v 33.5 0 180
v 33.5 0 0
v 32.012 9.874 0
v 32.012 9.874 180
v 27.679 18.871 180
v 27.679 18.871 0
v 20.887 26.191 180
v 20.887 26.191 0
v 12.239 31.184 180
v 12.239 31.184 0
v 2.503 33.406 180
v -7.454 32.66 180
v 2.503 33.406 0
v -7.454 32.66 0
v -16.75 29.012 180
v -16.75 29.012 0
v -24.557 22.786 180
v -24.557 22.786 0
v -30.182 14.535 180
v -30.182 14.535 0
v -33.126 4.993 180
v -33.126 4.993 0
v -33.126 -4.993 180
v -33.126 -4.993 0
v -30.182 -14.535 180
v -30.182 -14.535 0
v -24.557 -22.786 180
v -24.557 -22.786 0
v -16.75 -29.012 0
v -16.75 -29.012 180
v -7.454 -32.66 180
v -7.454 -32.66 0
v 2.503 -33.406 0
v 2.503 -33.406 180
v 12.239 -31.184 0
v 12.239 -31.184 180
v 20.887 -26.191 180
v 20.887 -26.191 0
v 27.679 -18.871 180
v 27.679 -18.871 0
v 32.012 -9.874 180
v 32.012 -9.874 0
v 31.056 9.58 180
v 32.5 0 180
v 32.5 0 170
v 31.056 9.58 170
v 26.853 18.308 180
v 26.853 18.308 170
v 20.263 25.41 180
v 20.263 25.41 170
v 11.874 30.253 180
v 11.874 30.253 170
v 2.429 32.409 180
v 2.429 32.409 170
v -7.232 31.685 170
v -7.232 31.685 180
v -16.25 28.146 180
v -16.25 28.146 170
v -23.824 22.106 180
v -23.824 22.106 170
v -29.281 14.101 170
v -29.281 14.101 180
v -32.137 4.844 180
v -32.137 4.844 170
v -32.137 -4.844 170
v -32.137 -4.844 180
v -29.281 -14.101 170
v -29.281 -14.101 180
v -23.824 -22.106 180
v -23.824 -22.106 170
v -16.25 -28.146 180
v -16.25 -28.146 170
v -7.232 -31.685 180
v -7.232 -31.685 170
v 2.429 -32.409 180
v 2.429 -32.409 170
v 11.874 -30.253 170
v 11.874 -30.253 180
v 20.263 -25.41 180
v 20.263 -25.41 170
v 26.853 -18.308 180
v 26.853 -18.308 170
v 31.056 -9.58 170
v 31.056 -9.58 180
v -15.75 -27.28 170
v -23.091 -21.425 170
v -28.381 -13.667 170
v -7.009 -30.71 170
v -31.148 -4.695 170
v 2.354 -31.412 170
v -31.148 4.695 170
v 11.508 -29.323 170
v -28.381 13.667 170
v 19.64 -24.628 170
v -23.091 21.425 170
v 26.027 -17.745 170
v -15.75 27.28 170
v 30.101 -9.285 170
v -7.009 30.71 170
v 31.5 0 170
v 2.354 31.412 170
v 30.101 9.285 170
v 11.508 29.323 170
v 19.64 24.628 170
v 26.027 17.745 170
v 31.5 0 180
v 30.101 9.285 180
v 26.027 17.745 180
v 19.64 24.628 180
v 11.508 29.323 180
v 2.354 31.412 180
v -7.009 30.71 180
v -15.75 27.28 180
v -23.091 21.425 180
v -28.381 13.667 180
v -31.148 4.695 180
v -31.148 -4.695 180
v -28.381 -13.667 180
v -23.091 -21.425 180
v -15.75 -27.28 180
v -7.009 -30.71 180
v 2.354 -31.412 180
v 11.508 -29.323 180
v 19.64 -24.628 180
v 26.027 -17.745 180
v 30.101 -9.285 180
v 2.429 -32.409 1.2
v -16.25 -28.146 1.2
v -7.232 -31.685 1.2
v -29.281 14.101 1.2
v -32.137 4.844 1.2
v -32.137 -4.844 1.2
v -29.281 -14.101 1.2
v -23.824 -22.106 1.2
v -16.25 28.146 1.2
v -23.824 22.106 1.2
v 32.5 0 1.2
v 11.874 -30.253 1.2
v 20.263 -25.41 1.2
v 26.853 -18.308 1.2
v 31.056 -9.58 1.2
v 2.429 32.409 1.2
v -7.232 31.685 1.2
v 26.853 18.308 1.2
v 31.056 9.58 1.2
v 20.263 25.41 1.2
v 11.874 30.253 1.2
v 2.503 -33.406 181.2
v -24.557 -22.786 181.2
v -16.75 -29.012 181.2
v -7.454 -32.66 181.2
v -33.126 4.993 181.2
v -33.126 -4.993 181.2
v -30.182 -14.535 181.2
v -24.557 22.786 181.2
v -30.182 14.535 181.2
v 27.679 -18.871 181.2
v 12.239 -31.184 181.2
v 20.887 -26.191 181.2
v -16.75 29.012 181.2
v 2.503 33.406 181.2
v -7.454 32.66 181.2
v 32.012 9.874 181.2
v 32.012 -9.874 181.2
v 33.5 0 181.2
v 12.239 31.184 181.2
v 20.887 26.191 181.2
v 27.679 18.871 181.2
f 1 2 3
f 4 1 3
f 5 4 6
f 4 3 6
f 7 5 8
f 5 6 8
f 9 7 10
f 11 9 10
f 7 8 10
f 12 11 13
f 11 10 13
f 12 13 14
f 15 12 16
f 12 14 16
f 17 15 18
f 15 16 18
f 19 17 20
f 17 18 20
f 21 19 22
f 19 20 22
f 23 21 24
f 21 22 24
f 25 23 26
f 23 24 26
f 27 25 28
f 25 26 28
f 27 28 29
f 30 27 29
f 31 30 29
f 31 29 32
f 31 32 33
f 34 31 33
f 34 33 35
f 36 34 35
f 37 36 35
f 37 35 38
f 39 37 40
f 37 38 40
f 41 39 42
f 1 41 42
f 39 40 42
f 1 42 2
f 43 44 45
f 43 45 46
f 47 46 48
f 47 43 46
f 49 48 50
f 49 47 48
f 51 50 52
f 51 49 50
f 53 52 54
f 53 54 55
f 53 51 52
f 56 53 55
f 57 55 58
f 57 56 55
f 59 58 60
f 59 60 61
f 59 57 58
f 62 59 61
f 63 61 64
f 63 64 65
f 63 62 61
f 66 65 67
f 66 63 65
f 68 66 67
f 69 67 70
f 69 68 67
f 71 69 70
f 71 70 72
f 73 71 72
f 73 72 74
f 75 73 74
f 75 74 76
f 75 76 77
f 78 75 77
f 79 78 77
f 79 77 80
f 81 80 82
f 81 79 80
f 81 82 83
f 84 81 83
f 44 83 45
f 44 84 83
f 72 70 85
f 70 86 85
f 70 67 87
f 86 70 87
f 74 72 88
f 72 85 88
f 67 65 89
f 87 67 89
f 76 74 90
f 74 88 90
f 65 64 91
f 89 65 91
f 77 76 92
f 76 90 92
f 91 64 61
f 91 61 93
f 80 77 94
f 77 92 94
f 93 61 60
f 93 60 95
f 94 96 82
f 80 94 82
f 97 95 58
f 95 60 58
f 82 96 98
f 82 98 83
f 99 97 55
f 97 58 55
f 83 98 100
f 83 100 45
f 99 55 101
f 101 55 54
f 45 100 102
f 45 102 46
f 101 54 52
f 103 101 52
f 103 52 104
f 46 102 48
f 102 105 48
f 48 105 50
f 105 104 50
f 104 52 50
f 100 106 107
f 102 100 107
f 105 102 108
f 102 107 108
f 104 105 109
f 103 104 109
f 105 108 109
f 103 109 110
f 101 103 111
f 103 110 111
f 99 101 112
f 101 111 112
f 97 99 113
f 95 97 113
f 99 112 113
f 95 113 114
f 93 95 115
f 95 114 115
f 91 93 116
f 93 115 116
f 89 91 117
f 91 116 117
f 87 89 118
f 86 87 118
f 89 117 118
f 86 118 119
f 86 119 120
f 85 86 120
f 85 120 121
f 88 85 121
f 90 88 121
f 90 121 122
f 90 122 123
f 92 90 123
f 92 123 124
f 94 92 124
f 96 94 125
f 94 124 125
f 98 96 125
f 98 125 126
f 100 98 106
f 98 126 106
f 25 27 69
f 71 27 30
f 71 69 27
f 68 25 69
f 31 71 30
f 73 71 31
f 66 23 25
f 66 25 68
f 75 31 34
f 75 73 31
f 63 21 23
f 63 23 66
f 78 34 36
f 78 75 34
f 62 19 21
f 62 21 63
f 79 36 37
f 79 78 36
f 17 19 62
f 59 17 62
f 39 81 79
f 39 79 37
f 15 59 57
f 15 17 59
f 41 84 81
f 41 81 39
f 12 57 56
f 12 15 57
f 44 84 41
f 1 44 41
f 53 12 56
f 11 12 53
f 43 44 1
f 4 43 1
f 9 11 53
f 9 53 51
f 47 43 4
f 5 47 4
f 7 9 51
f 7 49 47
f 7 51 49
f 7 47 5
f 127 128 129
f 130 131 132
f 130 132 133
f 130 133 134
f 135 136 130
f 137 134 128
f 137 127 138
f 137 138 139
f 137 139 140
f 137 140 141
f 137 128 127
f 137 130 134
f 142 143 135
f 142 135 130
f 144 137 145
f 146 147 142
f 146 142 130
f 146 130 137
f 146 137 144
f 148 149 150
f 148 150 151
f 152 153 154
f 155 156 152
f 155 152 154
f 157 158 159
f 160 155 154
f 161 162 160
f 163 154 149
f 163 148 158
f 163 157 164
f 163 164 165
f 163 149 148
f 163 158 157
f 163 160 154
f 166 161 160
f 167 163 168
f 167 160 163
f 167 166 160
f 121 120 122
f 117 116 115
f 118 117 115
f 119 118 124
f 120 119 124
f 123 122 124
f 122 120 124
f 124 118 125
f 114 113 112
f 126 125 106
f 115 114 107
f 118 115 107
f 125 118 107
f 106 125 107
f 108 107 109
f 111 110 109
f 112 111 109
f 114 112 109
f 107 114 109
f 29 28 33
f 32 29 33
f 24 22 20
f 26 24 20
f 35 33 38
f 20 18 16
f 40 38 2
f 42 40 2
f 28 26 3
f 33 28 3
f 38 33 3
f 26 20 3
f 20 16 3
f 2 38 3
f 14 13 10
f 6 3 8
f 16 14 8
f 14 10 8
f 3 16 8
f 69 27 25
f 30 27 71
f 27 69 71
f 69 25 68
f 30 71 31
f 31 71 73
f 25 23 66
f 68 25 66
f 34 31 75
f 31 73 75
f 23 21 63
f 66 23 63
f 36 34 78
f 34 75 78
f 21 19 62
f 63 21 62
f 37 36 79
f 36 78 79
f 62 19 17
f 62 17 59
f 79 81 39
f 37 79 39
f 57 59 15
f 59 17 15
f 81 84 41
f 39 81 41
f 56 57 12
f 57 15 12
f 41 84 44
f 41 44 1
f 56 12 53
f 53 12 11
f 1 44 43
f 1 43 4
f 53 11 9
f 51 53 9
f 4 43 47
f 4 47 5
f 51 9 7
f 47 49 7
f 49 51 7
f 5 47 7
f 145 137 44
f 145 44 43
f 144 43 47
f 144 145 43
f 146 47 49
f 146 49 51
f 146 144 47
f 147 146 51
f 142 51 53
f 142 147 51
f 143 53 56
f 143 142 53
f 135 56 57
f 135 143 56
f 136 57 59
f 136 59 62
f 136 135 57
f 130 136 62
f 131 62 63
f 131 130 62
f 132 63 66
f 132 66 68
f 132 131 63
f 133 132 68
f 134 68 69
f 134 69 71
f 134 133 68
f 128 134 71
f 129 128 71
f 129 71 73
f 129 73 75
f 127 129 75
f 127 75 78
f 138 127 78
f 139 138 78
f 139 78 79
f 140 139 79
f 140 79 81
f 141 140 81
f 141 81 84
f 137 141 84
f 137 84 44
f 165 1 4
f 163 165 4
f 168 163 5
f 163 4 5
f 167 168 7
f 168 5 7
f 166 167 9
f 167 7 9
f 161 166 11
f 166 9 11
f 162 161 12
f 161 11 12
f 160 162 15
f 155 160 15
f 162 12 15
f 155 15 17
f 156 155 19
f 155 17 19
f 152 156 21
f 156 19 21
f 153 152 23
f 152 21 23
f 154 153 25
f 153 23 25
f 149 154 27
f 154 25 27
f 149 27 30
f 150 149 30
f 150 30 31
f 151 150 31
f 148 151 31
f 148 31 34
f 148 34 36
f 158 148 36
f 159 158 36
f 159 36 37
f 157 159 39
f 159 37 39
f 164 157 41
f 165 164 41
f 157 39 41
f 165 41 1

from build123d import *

# Parameters (mm, degrees)
F0_R     = 33.5
F0_R_2   = 32.5
F1_DEPTH = 180
F2_DEPTH = 1.2
F3_R     = 33.5
F3_R_2   = 32.5
F3_R_3   = 31.5
F4_DEPTH = 1.2
F5_DEPTH = 10


with BuildPart() as f1:
    # F0 (on Top) → F1 (new body)
    with BuildSketch(Plane.XY):
        Circle(F0_R)
        Circle(F0_R_2, mode=Mode.SUBTRACT)
    extrude(amount=F1_DEPTH)

    # F0 (on Top) → F2 (join)
    with BuildSketch(Plane.XY):
        Circle(F0_R_2)
    extrude(amount=F2_DEPTH)


with BuildPart() as f4:
    # F3 (on face) → F4 (new body)
    with BuildSketch(Plane.XY.offset(180)):
        Circle(F3_R)
        Circle(F3_R_2, mode=Mode.SUBTRACT)
        Circle(F3_R_2)
        Circle(F3_R_3, mode=Mode.SUBTRACT)
        Circle(F3_R_3)
    extrude(amount=F4_DEPTH)

    # F3 (on face) → F5 (join)
    with BuildSketch(Plane.XY.offset(180)):
        Circle(F3_R_2)
        Circle(F3_R_3, mode=Mode.SUBTRACT)
    extrude(amount=-F5_DEPTH)


solid = Compound([f1.part, f4.part])
